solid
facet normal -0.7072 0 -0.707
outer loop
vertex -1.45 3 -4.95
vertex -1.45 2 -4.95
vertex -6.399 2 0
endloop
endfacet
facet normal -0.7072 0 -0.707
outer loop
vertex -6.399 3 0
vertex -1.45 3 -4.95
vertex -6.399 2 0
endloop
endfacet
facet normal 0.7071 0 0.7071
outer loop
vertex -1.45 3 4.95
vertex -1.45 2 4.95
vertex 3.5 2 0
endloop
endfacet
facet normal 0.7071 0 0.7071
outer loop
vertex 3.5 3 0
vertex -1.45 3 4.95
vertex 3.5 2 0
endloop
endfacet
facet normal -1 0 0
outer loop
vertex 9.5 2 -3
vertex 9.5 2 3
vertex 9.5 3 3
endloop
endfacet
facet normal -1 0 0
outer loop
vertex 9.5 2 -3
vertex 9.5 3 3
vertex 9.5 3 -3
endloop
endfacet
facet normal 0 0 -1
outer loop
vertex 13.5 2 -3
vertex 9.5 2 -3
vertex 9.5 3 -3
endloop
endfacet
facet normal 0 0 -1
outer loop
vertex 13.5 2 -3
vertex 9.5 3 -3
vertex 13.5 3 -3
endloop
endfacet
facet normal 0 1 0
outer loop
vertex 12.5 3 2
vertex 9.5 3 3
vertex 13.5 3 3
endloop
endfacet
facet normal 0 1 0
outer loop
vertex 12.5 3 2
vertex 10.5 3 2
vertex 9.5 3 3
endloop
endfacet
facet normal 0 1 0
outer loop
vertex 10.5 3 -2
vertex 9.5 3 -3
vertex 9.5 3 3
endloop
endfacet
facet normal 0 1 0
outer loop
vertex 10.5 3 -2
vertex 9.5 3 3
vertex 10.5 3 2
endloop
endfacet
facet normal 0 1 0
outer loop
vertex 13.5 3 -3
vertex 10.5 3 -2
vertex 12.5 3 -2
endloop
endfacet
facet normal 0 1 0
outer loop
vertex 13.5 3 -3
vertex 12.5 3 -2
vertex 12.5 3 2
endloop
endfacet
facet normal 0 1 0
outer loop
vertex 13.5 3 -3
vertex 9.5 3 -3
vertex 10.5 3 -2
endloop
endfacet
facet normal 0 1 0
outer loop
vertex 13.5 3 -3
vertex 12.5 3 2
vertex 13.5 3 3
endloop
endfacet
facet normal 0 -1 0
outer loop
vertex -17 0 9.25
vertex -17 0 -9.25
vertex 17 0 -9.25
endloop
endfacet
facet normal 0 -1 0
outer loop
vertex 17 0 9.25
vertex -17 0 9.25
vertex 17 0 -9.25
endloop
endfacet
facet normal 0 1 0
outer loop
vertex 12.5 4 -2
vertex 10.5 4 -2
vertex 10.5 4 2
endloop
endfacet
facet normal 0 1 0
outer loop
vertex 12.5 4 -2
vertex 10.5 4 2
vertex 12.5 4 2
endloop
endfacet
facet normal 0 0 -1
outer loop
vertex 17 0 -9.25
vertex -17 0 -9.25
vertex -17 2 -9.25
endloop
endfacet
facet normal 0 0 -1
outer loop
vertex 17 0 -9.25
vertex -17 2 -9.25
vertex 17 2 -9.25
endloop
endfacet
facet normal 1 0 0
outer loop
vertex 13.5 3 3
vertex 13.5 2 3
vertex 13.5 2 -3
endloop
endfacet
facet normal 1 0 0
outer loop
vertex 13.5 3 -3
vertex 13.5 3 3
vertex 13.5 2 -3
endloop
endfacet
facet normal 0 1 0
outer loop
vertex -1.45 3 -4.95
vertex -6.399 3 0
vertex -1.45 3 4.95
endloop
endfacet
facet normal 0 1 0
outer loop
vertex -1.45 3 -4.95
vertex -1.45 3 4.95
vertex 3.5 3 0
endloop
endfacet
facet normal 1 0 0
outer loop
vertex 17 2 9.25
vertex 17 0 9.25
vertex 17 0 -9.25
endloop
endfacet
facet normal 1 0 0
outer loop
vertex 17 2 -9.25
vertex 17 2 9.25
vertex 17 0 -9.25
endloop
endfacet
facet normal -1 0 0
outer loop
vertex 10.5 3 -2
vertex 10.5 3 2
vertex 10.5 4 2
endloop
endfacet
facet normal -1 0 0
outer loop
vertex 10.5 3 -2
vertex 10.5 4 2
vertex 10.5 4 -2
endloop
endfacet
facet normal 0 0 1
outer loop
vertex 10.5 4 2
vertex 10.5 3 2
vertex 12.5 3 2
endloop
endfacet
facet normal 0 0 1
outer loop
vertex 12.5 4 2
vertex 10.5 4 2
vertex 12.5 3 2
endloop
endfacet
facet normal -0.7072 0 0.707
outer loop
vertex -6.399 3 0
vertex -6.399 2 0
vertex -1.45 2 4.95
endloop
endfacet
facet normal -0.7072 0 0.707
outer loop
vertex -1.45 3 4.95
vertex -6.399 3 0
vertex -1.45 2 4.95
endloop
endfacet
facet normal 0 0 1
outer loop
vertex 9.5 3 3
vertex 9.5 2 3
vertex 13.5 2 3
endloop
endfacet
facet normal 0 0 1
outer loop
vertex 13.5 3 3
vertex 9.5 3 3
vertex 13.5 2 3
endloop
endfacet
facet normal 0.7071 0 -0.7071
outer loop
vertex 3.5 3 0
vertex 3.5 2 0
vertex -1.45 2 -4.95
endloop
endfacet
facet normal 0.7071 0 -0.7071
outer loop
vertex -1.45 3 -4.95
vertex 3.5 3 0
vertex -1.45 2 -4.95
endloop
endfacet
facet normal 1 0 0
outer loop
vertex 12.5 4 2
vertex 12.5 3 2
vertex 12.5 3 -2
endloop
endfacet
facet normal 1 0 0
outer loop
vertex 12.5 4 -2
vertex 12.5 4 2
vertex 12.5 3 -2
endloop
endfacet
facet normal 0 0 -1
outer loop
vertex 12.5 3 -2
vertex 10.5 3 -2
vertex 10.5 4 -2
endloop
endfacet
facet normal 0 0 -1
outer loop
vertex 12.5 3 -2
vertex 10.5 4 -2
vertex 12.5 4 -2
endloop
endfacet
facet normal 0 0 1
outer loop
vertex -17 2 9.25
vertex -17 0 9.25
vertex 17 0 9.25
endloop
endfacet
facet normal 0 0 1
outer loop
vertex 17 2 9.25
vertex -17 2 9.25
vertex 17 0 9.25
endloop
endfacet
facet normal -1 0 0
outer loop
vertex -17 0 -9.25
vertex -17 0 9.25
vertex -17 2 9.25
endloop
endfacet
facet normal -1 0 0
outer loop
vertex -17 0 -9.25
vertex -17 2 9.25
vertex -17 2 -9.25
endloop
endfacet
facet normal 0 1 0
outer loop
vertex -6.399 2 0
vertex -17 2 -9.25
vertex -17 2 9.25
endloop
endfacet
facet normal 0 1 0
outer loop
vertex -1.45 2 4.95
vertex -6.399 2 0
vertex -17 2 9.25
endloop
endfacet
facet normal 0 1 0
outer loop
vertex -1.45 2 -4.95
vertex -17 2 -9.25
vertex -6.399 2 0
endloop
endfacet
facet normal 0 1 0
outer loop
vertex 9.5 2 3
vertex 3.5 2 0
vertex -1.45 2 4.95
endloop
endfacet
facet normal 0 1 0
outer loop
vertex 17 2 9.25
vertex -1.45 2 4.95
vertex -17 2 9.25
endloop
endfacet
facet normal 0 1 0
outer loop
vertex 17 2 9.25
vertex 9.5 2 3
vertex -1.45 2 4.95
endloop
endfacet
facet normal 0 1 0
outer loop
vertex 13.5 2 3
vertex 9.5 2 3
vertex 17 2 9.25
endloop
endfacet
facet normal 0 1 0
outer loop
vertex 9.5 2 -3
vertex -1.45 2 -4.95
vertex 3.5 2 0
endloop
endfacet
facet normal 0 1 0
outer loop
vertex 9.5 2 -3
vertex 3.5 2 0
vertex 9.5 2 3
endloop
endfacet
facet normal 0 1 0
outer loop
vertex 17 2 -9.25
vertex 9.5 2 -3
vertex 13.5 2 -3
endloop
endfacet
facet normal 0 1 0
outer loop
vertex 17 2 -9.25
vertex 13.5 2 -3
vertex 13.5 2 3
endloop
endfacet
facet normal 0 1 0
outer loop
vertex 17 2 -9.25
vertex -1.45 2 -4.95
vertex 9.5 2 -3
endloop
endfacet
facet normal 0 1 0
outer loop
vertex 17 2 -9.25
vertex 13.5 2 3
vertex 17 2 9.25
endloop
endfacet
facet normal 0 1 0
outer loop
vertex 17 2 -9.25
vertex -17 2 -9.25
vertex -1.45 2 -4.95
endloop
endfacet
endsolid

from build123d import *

# Parameters (mm, degrees)
SKETCH1_W           = 34
SKETCH1_H           = 18.5
BOSS_EXTRUDE1_DEPTH = 2
SKETCH2_W           = 4
SKETCH2_H           = 6
BOSS_EXTRUDE2_DEPTH = 1
SKETCH3_W           = 2
SKETCH3_H           = 4
BOSS_EXTRUDE3_DEPTH = 1
BOSS_EXTRUDE4_DEPTH = 1


with BuildPart() as part:
    # Sketch1 → Boss-Extrude1 (new body)
    with BuildSketch(Plane(origin=(0, 0, 0), x_dir=(1, 0, 0), z_dir=(0, 1, 0))):
        Rectangle(SKETCH1_W, SKETCH1_H)
    extrude(amount=BOSS_EXTRUDE1_DEPTH)

    # Sketch2 → Boss-Extrude2 (add)
    with BuildSketch(Plane(origin=(0, 2, 0), x_dir=(1, 0, 0), z_dir=(0, 1, 0))):
        with Locations((11.5, 0)):
            Rectangle(SKETCH2_W, SKETCH2_H)
    extrude(amount=BOSS_EXTRUDE2_DEPTH)

    # Sketch3 → Boss-Extrude3 (add)
    with BuildSketch(Plane(origin=(0, 3, 0), x_dir=(1, 0, 0), z_dir=(0, 1, 0))):
        with Locations((11.5, 0)):
            Rectangle(SKETCH3_W, SKETCH3_H)
    extrude(amount=BOSS_EXTRUDE3_DEPTH)

    # Sketch4 → Boss-Extrude4 (add)
    with BuildSketch(Plane(origin=(0, 2, 0), x_dir=(1, 0, 0), z_dir=(0, 1, 0))):
        Polygon((3.5, 0), (-1.449747468, 4.949747468), (-6.399494937, 0), (-1.449747468, -4.949747468), align=None)
    extrude(amount=BOSS_EXTRUDE4_DEPTH)


solid = part.part
